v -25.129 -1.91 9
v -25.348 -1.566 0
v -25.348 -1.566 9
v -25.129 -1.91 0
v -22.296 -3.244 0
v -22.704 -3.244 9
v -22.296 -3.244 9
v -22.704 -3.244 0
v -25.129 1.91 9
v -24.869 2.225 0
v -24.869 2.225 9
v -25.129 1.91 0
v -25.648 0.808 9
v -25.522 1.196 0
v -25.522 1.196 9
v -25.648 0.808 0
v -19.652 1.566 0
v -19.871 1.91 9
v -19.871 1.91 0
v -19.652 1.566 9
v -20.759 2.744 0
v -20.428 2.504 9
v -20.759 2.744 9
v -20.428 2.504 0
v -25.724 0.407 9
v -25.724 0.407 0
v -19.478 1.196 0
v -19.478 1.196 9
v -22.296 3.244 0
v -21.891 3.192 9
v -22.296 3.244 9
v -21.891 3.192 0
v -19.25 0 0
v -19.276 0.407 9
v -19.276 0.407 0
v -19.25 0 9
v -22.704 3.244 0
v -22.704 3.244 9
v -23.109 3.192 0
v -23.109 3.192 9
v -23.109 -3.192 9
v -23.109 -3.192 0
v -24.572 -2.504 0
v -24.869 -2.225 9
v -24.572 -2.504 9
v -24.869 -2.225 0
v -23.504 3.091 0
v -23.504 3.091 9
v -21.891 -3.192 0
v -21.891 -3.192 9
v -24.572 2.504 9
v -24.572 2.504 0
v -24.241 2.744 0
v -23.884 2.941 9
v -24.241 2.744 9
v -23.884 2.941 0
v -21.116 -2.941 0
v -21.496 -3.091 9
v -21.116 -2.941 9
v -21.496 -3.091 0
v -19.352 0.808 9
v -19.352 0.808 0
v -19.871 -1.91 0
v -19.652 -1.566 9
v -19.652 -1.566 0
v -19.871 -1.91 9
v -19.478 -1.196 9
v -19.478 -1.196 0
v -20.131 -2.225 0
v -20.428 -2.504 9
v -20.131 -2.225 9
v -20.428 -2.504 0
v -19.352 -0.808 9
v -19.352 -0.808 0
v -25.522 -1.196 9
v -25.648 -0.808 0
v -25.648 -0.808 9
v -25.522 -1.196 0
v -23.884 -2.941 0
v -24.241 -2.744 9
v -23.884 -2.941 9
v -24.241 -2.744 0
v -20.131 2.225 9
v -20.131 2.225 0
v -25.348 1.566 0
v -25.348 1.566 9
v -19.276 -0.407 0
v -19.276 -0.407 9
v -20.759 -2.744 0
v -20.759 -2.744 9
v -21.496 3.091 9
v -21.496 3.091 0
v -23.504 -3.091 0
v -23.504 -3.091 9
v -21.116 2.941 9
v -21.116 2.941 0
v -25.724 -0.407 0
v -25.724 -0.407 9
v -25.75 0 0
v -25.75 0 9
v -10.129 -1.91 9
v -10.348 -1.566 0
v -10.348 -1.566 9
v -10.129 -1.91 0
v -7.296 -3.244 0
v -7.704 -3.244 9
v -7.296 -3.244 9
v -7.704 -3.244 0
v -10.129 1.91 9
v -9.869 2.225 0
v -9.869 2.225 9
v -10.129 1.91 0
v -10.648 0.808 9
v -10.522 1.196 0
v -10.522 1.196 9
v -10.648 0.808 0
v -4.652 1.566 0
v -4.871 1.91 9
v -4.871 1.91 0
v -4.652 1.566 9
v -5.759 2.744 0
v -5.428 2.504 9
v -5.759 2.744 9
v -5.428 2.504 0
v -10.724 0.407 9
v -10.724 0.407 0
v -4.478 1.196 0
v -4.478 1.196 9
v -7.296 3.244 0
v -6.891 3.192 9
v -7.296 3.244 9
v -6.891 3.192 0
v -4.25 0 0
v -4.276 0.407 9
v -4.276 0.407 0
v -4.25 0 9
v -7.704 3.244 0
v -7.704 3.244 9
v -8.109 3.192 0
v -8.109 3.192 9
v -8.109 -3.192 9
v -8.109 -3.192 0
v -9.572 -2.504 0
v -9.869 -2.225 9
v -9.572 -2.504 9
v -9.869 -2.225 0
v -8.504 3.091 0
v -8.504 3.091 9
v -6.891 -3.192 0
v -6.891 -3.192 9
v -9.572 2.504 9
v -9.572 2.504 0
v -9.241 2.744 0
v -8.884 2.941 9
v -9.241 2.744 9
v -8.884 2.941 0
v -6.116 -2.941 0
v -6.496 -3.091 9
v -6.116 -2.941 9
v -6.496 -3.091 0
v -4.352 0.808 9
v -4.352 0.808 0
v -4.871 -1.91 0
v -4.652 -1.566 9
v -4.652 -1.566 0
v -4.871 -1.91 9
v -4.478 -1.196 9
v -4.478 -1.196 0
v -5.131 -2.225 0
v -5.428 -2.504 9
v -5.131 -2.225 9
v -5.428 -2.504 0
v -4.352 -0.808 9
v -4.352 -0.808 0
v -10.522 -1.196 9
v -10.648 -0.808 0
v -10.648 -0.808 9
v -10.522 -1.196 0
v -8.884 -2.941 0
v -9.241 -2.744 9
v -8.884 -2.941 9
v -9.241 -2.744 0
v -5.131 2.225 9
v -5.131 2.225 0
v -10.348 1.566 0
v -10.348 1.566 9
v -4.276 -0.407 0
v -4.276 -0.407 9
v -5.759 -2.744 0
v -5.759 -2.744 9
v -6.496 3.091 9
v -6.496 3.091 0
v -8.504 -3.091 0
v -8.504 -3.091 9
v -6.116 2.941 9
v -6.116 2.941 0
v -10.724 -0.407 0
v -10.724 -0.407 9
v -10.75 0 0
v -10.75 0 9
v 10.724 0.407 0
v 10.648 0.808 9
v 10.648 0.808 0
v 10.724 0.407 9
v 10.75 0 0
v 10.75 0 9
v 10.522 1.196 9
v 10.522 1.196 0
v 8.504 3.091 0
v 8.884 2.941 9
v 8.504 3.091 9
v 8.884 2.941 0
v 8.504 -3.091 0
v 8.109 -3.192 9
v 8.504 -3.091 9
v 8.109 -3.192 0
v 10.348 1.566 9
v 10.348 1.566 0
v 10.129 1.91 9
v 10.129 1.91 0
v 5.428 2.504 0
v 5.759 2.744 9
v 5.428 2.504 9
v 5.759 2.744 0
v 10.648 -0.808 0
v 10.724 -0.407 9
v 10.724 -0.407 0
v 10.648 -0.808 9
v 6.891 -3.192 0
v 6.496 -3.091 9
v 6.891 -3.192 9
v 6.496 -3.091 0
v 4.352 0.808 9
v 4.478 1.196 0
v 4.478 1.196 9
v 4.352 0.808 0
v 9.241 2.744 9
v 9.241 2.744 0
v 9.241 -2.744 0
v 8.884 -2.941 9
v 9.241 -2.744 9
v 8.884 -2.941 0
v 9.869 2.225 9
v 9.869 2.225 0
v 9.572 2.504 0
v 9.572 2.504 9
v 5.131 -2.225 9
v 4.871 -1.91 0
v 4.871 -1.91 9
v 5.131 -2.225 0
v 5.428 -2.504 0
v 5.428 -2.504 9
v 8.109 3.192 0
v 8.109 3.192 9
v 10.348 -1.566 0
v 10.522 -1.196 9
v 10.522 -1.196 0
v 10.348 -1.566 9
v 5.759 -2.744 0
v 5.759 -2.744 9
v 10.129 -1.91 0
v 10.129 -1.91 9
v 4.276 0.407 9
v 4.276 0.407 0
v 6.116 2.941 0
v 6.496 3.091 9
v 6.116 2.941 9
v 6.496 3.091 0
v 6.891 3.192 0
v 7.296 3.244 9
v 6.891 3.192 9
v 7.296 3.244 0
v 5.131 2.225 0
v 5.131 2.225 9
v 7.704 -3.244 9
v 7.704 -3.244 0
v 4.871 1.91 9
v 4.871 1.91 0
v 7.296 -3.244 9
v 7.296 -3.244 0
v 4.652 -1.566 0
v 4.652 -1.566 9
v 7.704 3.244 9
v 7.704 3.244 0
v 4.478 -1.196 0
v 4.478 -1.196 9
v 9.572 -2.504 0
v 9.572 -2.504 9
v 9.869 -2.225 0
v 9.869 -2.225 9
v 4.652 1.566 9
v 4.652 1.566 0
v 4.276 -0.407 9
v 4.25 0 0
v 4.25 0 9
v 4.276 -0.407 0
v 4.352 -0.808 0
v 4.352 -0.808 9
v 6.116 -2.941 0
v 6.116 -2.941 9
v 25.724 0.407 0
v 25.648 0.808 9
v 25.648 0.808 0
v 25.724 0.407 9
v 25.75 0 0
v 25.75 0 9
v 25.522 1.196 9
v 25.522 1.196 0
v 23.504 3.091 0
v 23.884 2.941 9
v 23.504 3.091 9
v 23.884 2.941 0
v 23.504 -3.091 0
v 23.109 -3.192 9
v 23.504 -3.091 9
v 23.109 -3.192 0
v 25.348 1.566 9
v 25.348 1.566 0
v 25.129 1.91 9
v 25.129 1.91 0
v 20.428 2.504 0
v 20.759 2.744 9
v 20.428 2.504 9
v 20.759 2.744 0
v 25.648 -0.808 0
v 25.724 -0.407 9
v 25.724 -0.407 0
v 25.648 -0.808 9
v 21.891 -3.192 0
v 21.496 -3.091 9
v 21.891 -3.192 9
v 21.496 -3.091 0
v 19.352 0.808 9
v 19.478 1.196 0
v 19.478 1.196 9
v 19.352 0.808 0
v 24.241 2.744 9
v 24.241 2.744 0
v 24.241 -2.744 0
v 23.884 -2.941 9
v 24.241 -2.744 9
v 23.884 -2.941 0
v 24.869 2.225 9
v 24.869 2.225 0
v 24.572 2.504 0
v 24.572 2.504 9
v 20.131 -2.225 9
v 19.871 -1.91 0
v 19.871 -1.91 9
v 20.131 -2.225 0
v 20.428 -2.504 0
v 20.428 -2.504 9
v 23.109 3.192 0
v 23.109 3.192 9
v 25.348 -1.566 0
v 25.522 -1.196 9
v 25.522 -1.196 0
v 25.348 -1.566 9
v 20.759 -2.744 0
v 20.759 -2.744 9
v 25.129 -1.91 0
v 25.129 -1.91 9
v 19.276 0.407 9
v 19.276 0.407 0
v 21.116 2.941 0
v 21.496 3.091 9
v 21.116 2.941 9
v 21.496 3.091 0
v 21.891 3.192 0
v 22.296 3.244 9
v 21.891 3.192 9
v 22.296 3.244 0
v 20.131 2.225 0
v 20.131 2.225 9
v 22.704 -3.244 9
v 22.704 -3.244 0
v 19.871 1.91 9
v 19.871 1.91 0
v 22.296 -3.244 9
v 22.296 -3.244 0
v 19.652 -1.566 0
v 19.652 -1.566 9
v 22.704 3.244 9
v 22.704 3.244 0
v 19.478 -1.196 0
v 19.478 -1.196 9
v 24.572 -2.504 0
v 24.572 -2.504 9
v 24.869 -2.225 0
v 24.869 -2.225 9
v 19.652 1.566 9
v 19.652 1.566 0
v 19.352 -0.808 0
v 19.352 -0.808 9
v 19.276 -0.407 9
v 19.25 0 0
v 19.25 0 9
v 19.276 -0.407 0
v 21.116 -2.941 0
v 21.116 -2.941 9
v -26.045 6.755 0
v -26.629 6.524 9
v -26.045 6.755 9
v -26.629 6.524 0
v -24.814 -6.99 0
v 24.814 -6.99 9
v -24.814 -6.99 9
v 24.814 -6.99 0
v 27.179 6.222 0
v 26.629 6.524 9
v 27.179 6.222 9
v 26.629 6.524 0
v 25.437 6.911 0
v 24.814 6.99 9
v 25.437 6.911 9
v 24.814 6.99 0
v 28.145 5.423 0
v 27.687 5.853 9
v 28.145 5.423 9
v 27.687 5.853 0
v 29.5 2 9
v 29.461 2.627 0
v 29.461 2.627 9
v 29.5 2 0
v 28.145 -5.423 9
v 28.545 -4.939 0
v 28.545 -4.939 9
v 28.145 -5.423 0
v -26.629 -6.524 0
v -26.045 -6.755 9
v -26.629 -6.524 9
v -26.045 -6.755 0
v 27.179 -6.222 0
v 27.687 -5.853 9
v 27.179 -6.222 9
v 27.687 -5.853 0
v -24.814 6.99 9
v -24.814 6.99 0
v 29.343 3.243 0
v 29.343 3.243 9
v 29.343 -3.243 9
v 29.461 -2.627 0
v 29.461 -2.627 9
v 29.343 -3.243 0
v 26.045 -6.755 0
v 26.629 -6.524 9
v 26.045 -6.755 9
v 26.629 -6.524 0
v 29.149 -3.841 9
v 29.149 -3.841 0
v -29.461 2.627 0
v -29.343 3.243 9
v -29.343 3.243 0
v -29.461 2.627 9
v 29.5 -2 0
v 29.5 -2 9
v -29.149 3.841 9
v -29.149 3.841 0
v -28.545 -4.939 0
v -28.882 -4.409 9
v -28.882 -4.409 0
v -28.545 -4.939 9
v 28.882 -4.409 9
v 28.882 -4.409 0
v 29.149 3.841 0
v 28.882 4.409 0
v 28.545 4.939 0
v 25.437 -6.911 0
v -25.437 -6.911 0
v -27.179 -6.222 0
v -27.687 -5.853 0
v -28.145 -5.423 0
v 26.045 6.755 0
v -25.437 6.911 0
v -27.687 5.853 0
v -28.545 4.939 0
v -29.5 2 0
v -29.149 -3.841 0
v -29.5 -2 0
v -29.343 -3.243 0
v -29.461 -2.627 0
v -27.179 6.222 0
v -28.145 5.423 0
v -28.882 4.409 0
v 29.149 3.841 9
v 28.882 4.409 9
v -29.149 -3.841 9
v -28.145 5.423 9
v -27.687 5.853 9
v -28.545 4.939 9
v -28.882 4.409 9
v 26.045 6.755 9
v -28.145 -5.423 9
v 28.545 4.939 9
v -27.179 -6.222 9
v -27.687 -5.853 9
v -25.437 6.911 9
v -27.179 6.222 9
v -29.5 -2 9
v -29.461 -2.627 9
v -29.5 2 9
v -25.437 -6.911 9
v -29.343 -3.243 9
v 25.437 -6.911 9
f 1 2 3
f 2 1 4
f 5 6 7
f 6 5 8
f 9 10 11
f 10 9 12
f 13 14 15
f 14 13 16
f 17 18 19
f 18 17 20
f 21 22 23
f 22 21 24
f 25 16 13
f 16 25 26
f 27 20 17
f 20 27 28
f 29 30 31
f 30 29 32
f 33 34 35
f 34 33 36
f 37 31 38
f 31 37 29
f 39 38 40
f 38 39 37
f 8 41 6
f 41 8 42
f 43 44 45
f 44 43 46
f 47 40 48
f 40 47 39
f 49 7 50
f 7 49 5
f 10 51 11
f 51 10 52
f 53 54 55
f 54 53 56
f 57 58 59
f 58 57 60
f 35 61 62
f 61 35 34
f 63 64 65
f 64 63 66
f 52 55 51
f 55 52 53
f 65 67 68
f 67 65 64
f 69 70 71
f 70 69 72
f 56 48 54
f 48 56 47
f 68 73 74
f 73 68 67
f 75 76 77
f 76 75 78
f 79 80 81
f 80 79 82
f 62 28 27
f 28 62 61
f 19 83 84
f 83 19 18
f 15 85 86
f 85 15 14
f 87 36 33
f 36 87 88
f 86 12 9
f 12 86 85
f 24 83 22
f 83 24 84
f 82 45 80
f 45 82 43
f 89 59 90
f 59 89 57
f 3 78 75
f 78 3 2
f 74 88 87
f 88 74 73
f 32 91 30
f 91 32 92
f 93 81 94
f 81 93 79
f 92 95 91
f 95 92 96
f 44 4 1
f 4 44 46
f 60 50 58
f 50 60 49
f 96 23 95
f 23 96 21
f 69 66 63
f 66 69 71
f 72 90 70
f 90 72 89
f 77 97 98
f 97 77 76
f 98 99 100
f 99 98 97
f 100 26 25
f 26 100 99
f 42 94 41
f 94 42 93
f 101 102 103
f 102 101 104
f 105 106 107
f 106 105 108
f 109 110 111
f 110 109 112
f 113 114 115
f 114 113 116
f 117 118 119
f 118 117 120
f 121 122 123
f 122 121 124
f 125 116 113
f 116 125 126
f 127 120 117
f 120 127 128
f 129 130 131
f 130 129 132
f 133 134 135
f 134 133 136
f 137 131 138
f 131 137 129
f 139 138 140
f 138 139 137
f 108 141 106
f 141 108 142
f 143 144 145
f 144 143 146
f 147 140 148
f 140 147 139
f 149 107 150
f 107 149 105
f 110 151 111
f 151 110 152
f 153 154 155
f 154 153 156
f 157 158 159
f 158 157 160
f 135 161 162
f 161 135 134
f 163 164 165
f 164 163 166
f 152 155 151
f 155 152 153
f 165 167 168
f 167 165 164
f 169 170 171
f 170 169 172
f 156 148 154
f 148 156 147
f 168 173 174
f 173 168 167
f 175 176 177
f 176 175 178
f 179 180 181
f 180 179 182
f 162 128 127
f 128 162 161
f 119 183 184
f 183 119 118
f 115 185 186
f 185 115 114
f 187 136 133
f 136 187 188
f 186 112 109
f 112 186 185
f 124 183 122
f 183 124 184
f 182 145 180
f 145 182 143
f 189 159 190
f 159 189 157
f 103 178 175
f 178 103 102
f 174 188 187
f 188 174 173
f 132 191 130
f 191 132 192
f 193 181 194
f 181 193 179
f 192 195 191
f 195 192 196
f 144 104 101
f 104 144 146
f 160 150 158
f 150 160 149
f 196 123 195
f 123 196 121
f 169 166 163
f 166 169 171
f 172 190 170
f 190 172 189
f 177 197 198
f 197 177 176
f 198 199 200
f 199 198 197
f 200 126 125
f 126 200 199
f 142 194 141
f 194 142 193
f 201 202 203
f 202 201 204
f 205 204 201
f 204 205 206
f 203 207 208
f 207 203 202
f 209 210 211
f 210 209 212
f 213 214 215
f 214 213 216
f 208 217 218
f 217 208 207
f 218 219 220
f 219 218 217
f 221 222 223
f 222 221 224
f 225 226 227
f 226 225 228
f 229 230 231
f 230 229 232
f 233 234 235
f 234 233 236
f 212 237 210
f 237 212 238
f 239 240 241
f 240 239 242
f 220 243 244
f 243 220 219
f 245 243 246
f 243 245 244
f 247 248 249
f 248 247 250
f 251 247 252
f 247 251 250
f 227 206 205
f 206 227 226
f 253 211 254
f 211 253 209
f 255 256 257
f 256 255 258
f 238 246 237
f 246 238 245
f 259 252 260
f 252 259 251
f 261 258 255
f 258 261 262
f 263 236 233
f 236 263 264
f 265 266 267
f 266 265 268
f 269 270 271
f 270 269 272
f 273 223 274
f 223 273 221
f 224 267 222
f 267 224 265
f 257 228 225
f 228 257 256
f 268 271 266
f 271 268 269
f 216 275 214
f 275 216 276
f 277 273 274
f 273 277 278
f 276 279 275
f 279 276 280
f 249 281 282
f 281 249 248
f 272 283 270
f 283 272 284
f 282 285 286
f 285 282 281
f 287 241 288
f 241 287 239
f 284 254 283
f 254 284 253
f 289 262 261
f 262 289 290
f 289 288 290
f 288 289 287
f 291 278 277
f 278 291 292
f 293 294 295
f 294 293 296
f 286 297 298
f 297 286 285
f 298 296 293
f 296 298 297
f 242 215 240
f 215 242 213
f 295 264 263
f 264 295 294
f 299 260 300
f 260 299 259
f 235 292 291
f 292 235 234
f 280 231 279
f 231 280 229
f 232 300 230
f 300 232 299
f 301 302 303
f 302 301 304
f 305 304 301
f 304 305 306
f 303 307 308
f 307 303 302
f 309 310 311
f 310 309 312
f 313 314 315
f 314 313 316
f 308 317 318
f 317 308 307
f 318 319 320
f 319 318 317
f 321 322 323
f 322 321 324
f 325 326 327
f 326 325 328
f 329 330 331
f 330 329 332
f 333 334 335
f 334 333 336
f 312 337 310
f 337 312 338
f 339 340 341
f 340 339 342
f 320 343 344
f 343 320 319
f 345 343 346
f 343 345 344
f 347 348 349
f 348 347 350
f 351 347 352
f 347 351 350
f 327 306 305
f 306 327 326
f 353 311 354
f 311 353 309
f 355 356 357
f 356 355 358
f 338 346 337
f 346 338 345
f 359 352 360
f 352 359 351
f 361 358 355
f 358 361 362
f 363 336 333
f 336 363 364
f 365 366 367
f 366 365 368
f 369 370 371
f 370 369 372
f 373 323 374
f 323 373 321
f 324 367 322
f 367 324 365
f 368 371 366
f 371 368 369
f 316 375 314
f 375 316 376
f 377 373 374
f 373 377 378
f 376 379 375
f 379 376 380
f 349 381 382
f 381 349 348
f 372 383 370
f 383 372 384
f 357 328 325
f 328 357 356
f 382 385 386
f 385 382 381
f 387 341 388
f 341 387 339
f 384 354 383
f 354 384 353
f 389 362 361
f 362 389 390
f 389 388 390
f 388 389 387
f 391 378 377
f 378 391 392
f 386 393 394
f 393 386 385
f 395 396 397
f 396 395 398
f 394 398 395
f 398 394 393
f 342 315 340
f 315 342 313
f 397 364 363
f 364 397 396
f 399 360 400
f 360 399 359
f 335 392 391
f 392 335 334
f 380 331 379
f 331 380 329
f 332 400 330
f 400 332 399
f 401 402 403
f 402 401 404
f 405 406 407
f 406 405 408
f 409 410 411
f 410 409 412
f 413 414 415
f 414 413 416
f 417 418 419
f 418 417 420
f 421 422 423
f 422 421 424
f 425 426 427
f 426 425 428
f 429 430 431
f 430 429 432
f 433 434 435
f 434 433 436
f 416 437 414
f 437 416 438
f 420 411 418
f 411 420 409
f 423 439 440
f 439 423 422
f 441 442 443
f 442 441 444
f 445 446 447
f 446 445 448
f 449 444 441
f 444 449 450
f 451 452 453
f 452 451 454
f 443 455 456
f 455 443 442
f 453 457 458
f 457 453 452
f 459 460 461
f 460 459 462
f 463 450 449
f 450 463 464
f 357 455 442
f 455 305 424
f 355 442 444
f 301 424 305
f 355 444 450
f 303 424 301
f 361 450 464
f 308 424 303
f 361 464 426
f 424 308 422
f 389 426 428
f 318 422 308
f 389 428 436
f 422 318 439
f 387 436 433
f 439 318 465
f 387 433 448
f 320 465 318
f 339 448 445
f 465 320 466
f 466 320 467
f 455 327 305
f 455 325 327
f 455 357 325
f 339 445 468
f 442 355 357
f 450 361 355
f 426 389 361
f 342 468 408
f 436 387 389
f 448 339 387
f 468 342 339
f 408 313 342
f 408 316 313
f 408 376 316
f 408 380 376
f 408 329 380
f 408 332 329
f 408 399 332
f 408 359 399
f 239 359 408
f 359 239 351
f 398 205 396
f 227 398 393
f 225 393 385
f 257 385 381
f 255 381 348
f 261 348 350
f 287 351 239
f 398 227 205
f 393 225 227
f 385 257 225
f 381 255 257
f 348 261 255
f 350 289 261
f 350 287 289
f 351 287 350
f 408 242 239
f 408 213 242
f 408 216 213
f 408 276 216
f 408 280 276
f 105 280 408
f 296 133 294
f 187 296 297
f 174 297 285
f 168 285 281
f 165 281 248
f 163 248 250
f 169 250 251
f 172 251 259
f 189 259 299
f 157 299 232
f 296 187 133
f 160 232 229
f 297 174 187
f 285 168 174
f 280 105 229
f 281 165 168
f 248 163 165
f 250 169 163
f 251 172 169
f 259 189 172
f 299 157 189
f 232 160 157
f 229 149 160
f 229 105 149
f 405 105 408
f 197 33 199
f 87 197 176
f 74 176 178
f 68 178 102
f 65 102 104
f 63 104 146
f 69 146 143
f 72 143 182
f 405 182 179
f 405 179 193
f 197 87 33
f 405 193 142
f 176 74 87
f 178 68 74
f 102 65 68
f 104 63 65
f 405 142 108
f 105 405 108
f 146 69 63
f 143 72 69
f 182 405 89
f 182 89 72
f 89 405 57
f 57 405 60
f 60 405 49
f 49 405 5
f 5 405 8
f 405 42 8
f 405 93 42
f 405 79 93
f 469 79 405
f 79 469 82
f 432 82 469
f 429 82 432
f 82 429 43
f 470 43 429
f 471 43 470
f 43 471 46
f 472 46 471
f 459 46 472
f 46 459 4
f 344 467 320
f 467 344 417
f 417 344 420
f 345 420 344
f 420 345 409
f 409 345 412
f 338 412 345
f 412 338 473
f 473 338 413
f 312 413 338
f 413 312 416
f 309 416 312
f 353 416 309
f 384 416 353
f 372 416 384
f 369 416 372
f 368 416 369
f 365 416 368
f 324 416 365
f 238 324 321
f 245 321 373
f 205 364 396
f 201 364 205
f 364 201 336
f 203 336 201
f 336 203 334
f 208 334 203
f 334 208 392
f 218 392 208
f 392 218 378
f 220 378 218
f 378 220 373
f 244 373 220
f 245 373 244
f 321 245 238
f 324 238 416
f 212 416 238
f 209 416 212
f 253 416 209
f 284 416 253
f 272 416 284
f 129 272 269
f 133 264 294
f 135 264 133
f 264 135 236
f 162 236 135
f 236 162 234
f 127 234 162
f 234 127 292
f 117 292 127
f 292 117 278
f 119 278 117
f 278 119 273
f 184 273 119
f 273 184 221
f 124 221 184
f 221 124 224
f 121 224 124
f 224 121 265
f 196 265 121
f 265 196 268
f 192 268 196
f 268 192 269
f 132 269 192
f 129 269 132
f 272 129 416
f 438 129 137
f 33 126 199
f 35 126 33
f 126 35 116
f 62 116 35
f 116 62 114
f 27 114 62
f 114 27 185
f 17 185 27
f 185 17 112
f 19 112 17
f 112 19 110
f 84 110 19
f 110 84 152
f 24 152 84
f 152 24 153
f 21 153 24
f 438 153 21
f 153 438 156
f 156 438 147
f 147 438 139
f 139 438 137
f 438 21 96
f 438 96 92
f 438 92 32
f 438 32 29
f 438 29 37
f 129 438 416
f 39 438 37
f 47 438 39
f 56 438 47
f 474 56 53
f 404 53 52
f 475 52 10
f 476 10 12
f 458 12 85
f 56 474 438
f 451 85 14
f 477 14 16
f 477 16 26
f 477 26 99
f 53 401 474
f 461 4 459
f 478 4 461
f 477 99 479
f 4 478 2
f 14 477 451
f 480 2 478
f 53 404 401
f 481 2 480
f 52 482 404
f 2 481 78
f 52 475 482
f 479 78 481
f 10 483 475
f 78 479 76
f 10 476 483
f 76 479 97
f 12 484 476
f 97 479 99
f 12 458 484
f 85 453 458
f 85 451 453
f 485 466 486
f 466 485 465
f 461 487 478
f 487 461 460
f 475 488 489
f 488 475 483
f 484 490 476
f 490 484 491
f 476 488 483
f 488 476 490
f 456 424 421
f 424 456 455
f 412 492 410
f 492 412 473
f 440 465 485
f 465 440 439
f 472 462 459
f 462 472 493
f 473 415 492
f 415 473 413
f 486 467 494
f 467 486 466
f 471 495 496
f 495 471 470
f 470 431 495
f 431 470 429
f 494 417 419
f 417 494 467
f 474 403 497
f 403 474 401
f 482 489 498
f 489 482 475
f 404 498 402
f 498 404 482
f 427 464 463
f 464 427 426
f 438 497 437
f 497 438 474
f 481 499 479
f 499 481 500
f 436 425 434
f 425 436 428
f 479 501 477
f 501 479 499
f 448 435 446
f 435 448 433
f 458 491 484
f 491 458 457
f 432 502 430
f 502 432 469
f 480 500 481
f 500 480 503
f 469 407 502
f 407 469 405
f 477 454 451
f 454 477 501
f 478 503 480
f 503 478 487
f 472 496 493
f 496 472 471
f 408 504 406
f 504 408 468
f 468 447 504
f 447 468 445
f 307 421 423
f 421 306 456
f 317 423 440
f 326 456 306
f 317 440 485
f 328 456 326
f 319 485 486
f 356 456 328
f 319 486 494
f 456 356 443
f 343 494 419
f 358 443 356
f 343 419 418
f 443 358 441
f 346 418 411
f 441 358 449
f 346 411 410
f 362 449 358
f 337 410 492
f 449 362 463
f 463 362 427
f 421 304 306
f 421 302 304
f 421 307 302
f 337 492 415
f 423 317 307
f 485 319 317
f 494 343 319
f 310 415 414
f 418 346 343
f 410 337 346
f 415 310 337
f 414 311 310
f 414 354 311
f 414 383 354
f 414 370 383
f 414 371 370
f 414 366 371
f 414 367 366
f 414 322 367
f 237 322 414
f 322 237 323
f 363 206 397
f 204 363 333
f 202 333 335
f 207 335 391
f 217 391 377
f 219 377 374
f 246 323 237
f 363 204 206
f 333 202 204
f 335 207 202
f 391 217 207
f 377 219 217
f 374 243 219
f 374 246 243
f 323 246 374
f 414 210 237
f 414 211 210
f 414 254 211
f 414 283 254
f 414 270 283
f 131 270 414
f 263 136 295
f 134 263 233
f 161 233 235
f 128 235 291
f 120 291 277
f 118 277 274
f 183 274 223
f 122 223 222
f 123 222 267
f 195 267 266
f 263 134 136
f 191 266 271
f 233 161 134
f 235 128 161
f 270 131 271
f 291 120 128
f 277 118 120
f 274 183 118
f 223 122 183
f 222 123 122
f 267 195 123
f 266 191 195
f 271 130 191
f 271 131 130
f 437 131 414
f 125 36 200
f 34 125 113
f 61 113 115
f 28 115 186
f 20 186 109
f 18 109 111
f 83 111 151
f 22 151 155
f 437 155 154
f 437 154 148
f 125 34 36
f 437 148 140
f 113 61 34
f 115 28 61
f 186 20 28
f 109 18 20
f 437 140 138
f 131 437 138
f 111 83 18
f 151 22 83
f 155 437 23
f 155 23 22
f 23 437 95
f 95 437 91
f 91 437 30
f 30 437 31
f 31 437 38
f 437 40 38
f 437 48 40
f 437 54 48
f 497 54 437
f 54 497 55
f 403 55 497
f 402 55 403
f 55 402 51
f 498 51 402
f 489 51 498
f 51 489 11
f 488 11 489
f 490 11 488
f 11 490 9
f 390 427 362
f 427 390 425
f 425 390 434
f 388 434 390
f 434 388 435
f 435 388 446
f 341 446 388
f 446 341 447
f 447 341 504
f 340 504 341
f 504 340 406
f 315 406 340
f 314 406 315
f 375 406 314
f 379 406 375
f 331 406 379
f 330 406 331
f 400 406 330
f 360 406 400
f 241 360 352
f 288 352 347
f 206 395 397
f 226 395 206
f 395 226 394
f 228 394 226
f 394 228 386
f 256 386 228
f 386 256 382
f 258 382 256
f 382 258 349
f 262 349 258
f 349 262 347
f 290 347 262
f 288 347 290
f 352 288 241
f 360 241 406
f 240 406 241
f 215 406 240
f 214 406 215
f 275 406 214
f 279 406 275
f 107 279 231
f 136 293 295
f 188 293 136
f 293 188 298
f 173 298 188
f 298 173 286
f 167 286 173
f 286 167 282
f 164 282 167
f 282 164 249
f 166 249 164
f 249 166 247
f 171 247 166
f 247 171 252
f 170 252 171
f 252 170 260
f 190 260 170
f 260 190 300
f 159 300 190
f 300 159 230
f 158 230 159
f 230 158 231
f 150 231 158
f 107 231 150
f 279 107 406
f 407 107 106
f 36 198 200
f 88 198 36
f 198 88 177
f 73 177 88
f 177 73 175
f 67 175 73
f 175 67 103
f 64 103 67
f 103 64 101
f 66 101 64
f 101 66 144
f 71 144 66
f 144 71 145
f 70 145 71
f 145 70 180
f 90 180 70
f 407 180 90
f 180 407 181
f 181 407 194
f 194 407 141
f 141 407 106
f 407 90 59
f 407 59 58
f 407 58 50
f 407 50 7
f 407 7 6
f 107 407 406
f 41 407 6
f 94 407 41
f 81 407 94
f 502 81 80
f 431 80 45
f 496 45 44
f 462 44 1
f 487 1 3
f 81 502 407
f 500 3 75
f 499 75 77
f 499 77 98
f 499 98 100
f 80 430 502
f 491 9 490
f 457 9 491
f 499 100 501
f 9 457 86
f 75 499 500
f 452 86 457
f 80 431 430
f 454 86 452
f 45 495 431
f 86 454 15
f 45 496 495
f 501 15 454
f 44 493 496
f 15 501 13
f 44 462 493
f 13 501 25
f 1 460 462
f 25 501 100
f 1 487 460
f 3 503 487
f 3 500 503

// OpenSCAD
$fn = 50;


difference() {
	union() {
		hull() {
			translate(v = [-24.5000000000, 2.0000000000, 0]) {
				cylinder(h = 9, r = 5);
			}
			translate(v = [24.5000000000, 2.0000000000, 0]) {
				cylinder(h = 9, r = 5);
			}
			translate(v = [-24.5000000000, -2.0000000000, 0]) {
				cylinder(h = 9, r = 5);
			}
			translate(v = [24.5000000000, -2.0000000000, 0]) {
				cylinder(h = 9, r = 5);
			}
		}
	}
	union() {
		translate(v = [-22.5000000000, 0.0000000000, 0]) {
			translate(v = [0, 0, -100]) {
				cylinder(h = 200, r = 3.2500000000);
			}
		}
		translate(v = [-7.5000000000, 0.0000000000, 0]) {
			translate(v = [0, 0, -100]) {
				cylinder(h = 200, r = 3.2500000000);
			}
		}
		translate(v = [7.5000000000, 0.0000000000, 0]) {
			translate(v = [0, 0, -100]) {
				cylinder(h = 200, r = 3.2500000000);
			}
		}
		translate(v = [22.5000000000, 0.0000000000, 0]) {
			translate(v = [0, 0, -100]) {
				cylinder(h = 200, r = 3.2500000000);
			}
		}
	}
}
